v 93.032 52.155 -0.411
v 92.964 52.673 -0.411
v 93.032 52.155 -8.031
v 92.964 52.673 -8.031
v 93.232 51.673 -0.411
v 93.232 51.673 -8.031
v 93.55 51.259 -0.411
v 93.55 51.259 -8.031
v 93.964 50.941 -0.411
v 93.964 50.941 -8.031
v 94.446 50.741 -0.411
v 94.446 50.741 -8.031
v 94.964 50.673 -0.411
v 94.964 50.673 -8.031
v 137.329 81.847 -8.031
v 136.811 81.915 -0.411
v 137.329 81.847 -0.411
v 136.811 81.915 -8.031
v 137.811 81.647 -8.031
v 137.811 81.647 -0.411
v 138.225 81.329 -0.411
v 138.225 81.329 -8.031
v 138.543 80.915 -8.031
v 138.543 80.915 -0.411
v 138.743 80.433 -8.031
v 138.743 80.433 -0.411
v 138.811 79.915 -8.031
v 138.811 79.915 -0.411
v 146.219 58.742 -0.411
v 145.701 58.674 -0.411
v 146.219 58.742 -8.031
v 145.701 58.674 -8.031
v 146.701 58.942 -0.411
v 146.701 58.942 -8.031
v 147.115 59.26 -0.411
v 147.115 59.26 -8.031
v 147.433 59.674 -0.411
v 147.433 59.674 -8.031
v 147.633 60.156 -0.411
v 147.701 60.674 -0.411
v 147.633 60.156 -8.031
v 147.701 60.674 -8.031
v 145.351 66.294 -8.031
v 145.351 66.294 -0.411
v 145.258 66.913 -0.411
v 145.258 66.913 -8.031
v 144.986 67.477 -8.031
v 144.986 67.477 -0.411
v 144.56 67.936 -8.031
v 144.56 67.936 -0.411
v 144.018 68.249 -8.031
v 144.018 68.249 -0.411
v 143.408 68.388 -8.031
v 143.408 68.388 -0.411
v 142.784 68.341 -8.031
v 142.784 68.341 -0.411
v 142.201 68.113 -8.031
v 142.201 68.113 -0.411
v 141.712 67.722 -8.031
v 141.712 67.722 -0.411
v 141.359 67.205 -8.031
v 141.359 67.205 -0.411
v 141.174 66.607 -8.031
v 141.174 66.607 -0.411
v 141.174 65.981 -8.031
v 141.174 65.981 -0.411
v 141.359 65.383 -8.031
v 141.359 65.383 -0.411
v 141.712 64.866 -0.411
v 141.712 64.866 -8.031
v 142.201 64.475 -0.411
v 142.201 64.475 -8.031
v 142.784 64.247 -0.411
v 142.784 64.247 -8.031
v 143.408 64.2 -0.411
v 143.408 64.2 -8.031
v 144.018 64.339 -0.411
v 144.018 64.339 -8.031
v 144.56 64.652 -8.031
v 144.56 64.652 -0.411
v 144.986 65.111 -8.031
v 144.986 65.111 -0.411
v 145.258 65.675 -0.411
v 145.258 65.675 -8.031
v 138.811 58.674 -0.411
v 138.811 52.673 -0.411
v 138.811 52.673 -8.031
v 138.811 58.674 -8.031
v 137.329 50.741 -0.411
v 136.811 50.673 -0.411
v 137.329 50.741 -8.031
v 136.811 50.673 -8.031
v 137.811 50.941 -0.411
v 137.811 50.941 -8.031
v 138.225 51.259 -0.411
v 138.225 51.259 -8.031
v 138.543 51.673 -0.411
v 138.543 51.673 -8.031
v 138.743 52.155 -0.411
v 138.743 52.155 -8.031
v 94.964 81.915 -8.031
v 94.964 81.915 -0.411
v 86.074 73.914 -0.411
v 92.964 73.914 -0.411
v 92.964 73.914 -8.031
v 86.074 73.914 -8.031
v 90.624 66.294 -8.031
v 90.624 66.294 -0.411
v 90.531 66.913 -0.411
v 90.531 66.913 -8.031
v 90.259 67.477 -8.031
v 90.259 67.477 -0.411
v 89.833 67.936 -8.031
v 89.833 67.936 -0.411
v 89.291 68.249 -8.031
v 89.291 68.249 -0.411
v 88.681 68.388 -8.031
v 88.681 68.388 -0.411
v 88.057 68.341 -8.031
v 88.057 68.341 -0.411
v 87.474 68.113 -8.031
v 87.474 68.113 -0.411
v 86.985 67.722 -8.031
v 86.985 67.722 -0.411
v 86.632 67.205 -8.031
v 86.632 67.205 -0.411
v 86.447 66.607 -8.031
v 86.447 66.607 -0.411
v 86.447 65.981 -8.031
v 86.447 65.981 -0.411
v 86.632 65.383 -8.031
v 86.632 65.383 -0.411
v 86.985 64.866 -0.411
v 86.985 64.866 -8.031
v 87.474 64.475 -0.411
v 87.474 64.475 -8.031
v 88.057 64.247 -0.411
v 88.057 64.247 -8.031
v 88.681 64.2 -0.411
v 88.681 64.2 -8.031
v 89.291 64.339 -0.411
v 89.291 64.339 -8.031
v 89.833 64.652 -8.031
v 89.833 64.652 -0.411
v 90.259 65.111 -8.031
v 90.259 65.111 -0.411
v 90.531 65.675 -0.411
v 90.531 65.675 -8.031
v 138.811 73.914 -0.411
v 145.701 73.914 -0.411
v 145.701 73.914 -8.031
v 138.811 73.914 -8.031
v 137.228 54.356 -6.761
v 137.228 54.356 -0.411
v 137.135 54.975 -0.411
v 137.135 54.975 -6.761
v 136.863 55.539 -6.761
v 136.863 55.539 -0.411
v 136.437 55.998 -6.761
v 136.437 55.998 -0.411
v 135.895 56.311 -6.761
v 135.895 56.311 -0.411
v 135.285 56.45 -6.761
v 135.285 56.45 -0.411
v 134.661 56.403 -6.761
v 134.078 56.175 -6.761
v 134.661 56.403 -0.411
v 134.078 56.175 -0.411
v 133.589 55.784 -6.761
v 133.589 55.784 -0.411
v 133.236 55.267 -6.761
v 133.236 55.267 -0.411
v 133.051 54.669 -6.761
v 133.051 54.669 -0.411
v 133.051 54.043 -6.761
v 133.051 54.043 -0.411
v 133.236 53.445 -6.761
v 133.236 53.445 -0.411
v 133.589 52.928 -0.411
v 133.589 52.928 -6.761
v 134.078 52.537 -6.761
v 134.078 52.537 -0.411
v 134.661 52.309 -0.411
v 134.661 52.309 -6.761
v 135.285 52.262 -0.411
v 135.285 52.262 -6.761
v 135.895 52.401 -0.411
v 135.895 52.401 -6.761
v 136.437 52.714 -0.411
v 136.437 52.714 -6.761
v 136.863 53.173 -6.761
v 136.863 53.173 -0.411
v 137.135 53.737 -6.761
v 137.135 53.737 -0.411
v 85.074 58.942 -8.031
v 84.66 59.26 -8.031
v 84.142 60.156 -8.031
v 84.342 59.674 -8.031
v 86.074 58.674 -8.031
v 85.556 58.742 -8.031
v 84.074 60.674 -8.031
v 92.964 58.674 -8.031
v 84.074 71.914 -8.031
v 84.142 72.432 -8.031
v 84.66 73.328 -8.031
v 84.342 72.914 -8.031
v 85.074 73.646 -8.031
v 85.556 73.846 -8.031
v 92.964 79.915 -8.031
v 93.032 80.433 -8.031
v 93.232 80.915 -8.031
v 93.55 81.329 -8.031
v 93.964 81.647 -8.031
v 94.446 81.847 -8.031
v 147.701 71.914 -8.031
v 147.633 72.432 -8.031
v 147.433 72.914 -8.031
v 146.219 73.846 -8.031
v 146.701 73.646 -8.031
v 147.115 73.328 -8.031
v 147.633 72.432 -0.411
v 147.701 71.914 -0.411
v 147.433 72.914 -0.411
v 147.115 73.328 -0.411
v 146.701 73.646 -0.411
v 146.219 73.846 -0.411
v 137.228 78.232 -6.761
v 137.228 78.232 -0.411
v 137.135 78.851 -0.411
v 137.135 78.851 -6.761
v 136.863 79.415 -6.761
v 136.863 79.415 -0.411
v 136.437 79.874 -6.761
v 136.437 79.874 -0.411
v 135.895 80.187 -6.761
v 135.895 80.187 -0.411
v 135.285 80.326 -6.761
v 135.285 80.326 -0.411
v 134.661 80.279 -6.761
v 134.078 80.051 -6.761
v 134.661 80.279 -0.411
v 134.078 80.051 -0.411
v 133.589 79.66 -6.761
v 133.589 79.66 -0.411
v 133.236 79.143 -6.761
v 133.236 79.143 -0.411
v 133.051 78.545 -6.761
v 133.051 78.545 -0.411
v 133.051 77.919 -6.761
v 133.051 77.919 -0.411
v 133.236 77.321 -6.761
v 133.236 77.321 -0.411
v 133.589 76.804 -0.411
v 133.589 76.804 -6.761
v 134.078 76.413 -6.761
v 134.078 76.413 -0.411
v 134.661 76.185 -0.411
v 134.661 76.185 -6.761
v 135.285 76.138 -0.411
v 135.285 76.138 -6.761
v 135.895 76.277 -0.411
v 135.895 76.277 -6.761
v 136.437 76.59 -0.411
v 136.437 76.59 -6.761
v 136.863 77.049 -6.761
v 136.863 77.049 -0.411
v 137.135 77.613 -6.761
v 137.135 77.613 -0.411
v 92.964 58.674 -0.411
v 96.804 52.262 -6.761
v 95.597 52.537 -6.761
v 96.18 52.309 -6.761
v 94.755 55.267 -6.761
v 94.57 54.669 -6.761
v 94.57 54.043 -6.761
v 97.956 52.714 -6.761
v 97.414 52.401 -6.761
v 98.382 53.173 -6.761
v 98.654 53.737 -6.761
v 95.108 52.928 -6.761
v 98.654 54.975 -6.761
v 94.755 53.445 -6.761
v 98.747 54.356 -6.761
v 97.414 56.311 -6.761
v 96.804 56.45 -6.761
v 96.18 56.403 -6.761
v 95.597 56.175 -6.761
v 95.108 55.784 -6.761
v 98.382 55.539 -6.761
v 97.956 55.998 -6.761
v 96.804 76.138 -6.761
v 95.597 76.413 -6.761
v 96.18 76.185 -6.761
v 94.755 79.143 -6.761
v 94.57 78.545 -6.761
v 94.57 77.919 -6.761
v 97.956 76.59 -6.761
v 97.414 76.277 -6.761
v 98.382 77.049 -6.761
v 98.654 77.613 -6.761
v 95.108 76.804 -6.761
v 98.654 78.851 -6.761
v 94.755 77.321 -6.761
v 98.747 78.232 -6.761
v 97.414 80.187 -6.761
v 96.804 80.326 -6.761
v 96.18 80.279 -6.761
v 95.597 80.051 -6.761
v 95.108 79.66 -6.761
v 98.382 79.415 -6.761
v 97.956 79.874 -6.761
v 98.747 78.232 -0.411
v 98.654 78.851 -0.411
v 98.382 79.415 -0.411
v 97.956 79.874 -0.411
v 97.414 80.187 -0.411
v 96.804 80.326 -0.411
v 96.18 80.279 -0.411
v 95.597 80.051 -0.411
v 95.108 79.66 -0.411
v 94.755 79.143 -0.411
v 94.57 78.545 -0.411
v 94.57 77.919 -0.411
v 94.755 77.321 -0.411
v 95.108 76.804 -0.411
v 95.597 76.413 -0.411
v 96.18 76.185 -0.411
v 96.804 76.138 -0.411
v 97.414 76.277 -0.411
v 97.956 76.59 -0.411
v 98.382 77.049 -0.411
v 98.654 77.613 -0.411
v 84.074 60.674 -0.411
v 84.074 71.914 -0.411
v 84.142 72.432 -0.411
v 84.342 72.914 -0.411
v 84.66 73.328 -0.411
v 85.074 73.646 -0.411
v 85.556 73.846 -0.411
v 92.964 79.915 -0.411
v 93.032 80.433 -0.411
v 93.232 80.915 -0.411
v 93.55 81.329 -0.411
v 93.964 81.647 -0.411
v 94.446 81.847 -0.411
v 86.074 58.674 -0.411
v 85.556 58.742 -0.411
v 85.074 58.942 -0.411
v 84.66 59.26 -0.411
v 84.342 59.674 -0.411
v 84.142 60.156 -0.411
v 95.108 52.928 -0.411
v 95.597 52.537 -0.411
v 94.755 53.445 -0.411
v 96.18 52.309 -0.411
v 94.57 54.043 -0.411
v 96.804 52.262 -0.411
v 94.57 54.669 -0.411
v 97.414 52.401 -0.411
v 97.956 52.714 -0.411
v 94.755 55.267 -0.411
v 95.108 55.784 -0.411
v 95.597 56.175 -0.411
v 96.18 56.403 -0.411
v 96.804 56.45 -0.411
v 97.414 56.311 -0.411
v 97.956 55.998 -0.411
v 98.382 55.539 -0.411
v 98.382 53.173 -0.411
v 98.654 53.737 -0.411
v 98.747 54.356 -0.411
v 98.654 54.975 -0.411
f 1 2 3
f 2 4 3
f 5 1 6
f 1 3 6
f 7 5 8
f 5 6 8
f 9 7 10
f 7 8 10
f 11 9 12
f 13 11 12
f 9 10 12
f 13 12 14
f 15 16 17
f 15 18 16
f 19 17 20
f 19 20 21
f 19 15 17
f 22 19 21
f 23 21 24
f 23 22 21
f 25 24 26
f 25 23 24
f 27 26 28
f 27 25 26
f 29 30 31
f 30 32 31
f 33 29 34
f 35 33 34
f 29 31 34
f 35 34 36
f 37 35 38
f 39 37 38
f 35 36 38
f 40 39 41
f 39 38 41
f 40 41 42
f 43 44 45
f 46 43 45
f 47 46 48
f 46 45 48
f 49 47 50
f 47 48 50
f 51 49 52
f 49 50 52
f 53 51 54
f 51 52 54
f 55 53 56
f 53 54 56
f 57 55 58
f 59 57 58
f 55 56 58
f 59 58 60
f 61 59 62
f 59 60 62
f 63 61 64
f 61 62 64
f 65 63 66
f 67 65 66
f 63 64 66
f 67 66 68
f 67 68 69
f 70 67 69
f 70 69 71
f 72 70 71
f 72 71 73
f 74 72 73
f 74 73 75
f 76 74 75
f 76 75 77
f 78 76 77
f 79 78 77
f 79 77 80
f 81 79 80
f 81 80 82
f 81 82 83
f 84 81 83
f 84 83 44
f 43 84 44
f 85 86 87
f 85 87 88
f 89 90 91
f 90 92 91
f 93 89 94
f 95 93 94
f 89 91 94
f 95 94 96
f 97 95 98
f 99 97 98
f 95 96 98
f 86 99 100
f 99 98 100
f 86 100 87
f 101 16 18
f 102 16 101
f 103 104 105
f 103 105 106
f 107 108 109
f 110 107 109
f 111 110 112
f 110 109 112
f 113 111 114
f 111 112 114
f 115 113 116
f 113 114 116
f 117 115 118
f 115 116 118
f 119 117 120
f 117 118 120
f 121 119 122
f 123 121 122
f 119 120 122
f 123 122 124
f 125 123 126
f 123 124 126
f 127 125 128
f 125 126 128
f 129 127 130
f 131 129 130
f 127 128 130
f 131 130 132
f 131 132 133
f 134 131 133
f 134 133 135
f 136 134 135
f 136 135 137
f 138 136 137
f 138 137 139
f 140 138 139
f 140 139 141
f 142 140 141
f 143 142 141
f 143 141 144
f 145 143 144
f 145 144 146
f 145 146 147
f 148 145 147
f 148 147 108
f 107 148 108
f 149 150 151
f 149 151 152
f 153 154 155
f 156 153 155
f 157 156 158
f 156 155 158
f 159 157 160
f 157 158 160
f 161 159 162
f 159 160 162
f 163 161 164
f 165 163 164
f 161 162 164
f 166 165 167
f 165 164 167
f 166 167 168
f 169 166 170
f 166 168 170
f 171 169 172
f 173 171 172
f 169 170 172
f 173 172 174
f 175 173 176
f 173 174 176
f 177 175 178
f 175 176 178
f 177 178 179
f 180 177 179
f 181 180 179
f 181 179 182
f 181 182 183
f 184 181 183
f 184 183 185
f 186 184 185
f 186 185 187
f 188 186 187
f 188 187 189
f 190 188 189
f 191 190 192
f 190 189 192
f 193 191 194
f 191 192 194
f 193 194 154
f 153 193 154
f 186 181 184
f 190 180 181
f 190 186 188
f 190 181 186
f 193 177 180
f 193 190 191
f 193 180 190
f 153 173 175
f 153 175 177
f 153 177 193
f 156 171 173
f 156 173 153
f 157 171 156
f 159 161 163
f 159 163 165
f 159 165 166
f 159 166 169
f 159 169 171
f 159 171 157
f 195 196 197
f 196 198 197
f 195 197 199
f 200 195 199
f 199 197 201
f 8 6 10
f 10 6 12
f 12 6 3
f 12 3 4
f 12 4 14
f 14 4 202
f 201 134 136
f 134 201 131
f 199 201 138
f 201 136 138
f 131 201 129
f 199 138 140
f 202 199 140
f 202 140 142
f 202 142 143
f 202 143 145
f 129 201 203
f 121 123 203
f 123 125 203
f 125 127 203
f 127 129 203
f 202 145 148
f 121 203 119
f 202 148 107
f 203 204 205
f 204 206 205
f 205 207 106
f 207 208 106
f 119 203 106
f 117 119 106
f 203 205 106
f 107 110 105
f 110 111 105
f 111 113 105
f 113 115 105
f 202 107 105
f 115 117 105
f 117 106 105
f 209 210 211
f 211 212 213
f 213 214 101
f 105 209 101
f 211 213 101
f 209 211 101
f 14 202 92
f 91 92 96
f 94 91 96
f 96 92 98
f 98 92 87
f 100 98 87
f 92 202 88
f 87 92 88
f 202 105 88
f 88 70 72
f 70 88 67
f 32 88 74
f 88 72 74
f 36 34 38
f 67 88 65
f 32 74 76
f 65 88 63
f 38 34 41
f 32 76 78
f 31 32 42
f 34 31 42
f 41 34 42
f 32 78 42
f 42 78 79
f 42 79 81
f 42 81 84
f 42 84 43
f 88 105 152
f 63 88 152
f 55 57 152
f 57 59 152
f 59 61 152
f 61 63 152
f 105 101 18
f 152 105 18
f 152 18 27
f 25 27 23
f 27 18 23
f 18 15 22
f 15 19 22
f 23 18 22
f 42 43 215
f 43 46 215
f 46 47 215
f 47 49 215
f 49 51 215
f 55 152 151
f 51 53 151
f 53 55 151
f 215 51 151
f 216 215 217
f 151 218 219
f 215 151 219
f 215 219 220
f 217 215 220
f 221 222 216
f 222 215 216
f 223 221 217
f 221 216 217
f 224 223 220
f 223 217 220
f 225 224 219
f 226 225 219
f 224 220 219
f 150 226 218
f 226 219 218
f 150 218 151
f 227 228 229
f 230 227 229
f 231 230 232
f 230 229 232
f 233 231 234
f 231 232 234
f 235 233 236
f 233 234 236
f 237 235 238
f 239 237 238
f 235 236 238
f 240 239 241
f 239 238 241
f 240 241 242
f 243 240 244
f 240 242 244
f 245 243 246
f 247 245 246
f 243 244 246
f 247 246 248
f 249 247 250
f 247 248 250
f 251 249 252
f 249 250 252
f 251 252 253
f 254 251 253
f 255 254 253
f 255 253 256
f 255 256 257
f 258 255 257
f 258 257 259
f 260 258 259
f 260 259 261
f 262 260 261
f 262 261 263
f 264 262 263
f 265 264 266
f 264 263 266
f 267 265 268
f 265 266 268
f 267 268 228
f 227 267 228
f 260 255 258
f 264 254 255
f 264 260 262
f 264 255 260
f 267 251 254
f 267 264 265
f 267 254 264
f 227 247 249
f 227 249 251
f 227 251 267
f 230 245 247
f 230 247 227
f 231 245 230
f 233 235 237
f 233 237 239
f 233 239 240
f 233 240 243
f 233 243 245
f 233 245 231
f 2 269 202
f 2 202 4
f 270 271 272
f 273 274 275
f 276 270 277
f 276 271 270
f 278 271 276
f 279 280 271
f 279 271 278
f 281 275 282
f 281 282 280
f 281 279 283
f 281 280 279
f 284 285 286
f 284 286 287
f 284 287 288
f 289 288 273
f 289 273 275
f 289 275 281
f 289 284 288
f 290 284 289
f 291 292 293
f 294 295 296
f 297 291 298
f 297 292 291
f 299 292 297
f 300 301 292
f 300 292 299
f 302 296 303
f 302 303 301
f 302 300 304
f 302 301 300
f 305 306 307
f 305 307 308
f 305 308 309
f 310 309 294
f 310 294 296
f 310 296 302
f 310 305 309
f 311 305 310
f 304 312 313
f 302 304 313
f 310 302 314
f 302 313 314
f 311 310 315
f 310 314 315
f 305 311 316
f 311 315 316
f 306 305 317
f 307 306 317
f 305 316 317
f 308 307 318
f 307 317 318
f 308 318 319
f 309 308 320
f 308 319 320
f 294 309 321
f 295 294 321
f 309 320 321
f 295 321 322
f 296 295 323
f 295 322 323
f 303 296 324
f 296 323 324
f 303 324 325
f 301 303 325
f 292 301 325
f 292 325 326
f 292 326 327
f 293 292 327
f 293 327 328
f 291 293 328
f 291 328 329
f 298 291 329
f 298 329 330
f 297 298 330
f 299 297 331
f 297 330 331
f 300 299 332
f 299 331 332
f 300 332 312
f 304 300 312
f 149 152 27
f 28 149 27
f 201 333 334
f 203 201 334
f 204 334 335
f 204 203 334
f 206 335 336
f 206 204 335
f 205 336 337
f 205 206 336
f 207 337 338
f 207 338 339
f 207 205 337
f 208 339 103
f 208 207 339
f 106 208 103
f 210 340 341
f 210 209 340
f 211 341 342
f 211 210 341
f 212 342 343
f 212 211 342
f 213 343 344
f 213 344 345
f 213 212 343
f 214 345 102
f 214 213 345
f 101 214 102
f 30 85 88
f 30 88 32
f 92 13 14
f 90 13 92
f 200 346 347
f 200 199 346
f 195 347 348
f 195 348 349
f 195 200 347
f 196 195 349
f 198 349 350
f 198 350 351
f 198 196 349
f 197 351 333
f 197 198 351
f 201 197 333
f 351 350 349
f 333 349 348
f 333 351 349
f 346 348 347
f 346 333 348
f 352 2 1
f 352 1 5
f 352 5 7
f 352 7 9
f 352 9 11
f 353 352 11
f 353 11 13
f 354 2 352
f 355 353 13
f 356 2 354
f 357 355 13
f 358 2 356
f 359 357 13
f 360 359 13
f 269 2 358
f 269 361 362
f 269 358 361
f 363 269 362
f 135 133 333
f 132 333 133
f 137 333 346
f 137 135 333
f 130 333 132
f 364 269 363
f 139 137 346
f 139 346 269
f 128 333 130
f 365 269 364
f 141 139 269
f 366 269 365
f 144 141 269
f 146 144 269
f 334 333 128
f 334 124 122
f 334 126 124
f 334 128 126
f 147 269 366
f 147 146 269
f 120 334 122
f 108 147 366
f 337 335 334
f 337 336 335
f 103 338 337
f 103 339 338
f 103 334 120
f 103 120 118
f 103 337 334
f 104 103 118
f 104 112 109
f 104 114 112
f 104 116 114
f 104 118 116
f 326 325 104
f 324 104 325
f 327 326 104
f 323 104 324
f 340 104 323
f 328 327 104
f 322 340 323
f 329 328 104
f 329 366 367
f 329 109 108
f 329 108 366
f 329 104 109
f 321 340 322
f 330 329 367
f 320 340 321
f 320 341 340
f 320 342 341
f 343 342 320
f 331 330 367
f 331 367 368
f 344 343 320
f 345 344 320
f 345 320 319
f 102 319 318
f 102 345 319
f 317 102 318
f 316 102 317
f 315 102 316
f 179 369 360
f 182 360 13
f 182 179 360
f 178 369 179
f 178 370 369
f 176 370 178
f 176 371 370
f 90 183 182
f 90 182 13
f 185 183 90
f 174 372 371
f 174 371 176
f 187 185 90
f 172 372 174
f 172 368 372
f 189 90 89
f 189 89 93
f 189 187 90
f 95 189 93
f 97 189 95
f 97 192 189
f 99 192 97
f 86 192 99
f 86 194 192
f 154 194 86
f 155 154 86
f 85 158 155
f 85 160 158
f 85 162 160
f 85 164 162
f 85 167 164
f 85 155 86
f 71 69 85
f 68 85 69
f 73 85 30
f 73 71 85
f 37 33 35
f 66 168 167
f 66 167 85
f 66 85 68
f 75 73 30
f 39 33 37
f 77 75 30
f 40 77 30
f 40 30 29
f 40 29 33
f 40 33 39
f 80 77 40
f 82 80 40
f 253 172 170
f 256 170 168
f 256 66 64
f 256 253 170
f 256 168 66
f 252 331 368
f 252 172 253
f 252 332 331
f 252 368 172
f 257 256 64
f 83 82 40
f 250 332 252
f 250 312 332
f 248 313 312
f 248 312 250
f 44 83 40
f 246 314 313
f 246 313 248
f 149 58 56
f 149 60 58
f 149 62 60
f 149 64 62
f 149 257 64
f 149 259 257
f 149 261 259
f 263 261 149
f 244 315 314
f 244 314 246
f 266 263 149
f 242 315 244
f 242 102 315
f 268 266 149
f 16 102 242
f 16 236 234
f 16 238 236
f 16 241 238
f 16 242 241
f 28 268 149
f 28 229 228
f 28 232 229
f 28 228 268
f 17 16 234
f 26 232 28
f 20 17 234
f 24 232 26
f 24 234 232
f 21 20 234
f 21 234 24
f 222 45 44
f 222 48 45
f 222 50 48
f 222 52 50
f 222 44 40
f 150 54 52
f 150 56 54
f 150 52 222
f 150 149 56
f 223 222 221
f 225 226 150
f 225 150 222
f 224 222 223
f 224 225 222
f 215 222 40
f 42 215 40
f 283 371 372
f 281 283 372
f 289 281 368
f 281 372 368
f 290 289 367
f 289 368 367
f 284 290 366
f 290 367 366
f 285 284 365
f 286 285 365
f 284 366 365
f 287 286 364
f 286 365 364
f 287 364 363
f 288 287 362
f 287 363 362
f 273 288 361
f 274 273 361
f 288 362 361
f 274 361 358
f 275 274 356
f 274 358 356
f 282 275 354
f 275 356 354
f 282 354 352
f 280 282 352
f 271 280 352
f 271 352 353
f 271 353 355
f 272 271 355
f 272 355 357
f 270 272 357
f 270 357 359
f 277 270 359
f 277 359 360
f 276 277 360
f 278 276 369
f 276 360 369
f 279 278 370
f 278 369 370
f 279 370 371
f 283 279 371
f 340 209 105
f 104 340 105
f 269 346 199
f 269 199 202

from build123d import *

# Parameters (mm, degrees)
BOSS_EXTRUDE1_DEPTH = 7.62
SKETCH3_R           = 2.099999991
SKETCH3_R_2         = 2.1
CUT_EXTRUDE1_DEPTH  = 170.067196777
SKETCH3_3_R         = 2.1
CUT_EXTRUDE2_DEPTH  = 6.35
FILLET1_R           = 2


with BuildPart() as part:
    # Sketch2 → Boss-Extrude1 (new body)
    with BuildSketch(Plane(origin=(0, 0, -0.41148), x_dir=(-1, 0, 0), z_dir=(0, 0, -1))):
        Polygon((-92.964, 58.674), (-92.964, 50.673), (-138.811, 50.673), (-138.811, 58.674), (-147.701, 58.674), (-147.701, 66.294), (-147.701, 73.914), (-138.811, 73.914), (-138.811, 81.915), (-92.964, 81.915), (-92.964, 73.914), (-84.074, 73.914), (-84.074, 66.294), (-84.074, 58.674), align=None)
    extrude(amount=BOSS_EXTRUDE1_DEPTH)

    # Sketch3 → Cut-Extrude1 (cut, through all)
    with BuildSketch(Plane.XY.offset(-0.41148)):
        with Locations((88.524, 66.294)):
            Circle(SKETCH3_R)
        with Locations((143.251, 66.294)):
            Circle(SKETCH3_R_2)
    extrude(amount=-CUT_EXTRUDE1_DEPTH, mode=Mode.SUBTRACT)

    # Sketch3<3> → Cut-Extrude2 (cut)
    with BuildSketch(Plane.XY.offset(-0.41148)):
        with Locations((96.647, 78.232)):
            Circle(SKETCH3_3_R)
        with Locations((96.647, 54.356)):
            Circle(SKETCH3_3_R)
        with Locations((135.128, 54.356)):
            Circle(SKETCH3_3_R)
        with Locations((135.128, 78.232)):
            Circle(SKETCH3_3_R)
    extrude(amount=-CUT_EXTRUDE2_DEPTH, mode=Mode.SUBTRACT)

    # Fillet1
    fillet1_edges = [part.edges().sort_by_distance(p)[0] for p in [
        (138.811, 81.915, -4.22148),
        (92.964, 81.915, -4.22148),
        (84.074, 73.914, -4.22148),
        (84.074, 58.674, -4.22148),
        (92.964, 50.673, -4.22148),
        (138.811, 50.673, -4.22148),
        (147.701, 58.674, -4.22148),
        (147.701, 73.914, -4.22148),
    ]]
    fillet(fillet1_edges, radius=FILLET1_R)


solid = part.part
